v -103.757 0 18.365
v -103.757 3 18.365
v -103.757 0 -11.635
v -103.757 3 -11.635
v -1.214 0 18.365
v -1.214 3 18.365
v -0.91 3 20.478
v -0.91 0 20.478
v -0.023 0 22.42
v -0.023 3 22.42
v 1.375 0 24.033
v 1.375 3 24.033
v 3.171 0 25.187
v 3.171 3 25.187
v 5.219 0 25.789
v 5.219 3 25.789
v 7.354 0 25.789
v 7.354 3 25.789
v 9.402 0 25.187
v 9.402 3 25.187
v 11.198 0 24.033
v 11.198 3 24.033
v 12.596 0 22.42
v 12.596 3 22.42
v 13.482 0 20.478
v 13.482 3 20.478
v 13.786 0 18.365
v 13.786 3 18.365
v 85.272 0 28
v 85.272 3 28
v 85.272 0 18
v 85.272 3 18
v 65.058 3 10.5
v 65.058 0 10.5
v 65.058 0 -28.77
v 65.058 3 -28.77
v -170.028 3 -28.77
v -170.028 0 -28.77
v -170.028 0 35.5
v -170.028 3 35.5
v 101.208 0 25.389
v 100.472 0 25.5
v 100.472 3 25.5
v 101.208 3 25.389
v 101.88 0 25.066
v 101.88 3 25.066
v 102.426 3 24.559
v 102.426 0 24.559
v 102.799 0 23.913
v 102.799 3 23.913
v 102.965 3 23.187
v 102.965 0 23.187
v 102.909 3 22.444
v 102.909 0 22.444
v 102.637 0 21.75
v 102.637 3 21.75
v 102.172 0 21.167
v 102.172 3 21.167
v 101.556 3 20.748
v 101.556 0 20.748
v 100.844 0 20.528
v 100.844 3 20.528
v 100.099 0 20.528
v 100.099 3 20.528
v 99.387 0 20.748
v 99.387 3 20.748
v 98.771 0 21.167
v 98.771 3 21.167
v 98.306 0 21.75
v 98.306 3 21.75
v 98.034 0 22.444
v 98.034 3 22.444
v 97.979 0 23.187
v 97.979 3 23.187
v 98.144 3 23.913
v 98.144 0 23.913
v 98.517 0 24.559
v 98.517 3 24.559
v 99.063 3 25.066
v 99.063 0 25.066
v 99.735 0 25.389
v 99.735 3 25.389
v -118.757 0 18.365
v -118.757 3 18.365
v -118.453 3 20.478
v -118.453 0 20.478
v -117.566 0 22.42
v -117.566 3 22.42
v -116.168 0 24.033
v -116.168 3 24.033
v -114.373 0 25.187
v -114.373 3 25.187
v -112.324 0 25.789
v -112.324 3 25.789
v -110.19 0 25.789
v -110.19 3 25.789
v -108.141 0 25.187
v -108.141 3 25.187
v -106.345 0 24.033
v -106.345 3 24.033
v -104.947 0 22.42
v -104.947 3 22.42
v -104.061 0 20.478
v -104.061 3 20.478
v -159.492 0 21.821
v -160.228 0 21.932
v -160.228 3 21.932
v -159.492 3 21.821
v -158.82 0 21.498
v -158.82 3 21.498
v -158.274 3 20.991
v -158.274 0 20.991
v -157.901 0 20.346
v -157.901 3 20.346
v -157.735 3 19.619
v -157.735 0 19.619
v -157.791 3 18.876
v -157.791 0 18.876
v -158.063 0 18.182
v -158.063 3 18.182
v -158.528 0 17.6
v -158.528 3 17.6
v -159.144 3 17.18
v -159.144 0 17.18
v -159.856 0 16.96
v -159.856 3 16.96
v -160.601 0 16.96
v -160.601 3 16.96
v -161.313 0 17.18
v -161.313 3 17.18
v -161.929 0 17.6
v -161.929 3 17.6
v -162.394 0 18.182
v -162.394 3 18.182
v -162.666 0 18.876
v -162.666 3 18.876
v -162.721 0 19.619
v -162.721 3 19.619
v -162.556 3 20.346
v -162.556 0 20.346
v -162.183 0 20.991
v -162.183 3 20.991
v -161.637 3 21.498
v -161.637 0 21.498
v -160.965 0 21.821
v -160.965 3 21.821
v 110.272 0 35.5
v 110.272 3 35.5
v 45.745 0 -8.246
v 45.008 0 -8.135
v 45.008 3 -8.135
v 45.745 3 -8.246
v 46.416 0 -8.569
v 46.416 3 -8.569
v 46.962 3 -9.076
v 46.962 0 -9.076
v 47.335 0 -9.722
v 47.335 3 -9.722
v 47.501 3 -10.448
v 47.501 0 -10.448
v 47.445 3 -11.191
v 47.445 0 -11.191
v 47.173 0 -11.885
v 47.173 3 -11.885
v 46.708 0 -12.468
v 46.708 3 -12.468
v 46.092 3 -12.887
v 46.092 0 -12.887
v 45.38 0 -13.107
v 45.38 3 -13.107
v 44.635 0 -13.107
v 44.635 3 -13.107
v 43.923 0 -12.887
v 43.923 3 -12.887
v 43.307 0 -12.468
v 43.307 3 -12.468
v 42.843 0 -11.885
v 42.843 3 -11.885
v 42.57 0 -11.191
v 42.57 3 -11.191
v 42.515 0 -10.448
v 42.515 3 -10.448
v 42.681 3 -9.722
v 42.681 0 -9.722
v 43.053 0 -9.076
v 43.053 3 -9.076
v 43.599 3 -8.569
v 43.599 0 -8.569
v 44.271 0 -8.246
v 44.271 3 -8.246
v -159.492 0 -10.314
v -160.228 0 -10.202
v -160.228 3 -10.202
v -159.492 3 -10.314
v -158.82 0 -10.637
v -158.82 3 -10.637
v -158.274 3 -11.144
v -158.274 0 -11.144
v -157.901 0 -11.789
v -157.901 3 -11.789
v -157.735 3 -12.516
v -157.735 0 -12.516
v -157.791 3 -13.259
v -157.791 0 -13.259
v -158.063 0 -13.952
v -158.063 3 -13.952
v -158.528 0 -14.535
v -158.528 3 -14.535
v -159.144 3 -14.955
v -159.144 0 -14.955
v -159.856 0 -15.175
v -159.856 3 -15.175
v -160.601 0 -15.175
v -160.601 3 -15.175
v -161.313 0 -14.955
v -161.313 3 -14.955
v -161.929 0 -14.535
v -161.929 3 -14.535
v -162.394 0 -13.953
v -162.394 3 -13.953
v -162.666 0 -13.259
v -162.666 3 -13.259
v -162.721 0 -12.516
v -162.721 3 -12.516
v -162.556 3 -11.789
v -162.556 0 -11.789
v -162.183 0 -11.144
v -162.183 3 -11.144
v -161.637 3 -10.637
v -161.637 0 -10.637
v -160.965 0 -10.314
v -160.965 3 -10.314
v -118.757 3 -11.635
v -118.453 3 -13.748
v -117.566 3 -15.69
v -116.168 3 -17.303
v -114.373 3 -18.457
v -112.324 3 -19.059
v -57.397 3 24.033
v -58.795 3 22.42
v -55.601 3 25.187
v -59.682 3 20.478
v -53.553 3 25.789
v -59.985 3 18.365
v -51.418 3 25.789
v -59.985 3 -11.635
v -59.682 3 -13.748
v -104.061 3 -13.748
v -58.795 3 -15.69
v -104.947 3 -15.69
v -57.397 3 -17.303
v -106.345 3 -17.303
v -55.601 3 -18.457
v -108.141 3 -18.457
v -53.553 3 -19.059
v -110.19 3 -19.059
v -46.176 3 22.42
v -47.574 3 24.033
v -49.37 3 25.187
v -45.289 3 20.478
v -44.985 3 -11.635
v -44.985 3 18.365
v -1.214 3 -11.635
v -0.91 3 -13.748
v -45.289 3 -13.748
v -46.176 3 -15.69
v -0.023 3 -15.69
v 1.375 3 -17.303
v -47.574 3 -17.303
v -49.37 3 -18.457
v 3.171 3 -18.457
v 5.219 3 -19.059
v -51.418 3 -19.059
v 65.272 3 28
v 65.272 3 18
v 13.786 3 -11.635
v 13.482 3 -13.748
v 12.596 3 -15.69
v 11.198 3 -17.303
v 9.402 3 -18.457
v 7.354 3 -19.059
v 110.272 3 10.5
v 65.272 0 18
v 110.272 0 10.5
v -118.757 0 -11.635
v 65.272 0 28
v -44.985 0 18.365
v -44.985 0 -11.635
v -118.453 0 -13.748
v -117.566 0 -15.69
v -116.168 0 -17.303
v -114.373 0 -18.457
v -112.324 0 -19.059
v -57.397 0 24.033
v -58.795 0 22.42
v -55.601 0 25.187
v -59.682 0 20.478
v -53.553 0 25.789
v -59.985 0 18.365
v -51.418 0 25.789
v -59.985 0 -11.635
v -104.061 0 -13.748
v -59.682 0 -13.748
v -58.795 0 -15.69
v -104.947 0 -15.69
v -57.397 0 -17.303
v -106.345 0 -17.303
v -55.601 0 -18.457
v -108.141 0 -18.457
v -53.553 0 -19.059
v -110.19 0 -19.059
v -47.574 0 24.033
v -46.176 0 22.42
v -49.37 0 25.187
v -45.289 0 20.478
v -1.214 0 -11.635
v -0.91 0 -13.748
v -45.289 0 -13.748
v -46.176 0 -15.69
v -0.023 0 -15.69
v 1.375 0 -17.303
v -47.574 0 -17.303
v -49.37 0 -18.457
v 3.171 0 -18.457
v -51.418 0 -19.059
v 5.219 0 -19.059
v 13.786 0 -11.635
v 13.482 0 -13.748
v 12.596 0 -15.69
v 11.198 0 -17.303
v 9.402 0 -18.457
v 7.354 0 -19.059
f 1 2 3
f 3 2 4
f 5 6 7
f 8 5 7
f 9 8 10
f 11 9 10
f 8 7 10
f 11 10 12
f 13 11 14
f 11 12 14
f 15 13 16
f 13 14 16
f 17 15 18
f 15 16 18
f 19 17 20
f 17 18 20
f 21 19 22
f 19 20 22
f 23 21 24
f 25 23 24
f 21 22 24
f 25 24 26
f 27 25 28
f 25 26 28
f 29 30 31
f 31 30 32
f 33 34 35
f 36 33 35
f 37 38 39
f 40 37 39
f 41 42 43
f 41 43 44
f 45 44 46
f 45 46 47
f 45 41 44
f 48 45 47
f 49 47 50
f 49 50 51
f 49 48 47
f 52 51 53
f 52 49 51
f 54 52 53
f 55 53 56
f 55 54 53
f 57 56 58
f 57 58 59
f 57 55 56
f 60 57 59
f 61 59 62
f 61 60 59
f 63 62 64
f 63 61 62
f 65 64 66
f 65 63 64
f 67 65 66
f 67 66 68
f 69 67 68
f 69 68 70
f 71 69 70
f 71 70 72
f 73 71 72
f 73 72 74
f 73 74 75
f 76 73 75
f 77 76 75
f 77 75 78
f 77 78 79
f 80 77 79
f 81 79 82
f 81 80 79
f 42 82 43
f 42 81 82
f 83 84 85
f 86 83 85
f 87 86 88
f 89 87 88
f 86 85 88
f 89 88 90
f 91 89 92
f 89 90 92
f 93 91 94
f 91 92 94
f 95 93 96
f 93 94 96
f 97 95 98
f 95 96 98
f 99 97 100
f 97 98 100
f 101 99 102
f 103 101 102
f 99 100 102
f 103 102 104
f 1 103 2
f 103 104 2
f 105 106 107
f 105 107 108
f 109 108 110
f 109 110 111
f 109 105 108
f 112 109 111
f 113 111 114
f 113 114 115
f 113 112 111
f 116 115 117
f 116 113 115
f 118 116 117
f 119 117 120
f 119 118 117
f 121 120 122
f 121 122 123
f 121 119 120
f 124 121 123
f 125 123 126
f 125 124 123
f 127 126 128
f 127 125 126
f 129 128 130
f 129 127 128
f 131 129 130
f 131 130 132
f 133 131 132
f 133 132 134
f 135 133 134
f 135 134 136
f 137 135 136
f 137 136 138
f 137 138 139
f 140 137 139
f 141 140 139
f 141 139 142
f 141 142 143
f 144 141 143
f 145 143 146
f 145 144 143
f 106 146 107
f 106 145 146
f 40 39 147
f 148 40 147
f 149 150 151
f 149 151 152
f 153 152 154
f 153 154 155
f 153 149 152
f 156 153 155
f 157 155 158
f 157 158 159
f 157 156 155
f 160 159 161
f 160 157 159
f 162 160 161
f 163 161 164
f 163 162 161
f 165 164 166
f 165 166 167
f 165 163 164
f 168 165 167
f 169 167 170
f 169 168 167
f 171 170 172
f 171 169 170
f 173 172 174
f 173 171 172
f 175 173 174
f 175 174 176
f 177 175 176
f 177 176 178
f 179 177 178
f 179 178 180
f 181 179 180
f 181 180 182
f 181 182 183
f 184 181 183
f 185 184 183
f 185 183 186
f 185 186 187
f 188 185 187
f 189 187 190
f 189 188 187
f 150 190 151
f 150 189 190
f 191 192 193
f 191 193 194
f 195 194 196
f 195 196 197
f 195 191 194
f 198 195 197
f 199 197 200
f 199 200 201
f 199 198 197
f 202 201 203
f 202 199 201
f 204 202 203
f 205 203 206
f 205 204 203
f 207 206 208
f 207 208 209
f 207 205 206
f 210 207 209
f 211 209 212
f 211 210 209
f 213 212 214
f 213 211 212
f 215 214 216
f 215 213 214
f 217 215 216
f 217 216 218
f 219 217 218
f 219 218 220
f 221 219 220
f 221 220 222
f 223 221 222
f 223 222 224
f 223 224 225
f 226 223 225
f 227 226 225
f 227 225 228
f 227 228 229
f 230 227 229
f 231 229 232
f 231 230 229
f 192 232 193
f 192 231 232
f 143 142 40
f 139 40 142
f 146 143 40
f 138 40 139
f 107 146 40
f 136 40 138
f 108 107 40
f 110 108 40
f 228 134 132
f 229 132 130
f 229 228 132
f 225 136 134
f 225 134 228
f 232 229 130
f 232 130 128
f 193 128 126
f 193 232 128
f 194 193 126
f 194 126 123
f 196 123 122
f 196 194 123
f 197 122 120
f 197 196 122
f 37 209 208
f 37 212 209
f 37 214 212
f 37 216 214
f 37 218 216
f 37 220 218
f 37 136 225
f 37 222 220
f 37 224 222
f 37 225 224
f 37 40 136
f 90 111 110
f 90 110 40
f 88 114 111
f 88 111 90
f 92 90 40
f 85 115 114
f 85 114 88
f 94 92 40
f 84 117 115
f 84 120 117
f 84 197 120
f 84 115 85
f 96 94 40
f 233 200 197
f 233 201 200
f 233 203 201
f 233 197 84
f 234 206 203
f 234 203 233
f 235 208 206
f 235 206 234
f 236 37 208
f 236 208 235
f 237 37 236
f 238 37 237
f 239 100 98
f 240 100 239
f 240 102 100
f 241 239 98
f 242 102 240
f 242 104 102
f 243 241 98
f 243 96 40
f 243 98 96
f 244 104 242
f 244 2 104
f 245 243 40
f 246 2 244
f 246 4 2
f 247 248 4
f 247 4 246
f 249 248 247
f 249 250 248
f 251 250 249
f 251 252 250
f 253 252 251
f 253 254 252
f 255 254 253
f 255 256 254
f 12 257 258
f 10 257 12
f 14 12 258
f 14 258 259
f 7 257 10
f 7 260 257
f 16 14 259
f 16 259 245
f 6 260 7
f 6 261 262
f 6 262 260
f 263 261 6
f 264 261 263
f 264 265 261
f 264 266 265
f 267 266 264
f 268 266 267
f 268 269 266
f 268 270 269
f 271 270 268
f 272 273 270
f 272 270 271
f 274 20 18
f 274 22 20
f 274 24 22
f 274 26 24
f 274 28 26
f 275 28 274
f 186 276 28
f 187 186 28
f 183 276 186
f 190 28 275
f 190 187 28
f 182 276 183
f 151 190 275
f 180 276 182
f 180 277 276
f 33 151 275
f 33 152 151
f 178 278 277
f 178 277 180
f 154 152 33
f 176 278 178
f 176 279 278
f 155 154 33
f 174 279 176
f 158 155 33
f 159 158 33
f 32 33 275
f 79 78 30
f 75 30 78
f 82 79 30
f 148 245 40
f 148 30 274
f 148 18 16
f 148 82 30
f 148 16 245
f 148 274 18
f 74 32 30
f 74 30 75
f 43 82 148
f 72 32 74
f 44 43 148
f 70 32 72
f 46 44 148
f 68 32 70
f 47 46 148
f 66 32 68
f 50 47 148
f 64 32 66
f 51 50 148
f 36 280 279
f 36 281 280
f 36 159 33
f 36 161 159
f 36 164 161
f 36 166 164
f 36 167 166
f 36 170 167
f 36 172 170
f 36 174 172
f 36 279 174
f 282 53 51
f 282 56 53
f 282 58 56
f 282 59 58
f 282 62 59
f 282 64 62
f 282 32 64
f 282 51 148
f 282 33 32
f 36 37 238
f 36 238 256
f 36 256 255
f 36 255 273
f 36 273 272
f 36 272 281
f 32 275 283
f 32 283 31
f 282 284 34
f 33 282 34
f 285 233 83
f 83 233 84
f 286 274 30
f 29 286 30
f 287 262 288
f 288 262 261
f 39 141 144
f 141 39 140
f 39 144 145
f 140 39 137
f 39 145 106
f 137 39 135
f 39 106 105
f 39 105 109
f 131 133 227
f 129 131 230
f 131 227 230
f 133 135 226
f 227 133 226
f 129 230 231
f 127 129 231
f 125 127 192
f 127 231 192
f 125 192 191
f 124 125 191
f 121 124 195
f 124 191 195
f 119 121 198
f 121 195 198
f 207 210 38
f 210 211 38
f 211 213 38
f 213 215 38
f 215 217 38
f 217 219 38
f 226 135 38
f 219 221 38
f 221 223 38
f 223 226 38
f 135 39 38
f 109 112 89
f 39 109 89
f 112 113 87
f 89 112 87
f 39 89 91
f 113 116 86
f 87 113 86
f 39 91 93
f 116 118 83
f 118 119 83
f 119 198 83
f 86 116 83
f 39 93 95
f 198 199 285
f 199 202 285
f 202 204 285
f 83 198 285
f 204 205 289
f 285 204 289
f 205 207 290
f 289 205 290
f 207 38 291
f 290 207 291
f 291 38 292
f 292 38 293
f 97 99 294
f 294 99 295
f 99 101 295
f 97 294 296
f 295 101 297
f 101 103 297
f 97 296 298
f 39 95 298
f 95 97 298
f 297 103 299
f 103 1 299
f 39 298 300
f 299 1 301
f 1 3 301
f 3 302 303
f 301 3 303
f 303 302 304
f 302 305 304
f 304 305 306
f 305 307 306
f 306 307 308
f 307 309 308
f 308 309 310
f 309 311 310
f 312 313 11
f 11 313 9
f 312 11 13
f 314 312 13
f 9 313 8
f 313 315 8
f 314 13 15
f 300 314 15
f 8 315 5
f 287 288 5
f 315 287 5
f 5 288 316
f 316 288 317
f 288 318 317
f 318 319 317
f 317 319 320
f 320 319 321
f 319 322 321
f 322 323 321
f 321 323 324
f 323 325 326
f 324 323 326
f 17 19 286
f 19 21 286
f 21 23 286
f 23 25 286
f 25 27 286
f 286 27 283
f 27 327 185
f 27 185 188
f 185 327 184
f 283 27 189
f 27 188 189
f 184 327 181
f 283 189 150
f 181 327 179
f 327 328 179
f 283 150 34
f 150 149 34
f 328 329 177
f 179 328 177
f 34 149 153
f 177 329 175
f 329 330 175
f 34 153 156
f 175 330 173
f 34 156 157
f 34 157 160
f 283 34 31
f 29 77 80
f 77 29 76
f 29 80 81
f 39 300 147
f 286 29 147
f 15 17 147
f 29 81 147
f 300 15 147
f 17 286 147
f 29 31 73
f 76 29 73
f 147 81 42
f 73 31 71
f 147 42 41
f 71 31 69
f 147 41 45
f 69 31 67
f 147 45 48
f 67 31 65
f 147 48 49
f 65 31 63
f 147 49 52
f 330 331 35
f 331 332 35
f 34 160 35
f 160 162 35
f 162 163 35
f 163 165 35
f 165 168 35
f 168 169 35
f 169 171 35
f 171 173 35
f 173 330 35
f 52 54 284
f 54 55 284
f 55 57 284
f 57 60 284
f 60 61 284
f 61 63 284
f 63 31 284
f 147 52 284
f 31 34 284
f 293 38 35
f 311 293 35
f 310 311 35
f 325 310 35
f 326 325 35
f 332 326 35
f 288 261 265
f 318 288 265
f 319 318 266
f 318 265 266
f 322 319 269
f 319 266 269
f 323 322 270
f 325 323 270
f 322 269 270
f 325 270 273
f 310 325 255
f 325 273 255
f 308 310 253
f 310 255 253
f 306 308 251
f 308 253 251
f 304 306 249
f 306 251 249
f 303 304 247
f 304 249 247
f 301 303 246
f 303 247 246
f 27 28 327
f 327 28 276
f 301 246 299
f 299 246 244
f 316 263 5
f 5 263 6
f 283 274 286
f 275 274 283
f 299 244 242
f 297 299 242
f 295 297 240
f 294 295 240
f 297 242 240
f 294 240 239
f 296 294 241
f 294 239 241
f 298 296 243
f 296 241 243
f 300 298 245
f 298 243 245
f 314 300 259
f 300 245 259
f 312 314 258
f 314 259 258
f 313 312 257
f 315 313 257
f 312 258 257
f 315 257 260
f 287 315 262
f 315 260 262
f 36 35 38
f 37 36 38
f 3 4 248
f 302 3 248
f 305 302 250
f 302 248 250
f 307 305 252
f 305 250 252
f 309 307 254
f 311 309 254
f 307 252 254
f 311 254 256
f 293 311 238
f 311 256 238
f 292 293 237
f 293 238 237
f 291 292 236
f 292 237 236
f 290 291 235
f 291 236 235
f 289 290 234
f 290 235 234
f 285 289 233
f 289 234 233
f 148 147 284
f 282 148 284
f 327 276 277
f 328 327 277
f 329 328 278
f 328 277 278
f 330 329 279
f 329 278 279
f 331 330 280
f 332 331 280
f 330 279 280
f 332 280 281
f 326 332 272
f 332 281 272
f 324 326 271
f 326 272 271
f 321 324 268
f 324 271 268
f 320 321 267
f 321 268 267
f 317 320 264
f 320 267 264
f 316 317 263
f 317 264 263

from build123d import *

# Parameters (mm, degrees)
ESQUISSE1_R             = 2.5
BOSS_EXTRU_1_DEPTH      = 3
ESQUISSE2_W             = 20
ESQUISSE2_H             = 10
ENL_V_MAT_EXTRU_1_DEPTH = 174.720827721


with BuildPart() as part:
    # Esquisse1 → Boss.-Extru.1 (new body)
    with BuildSketch(Plane(origin=(0, 0, 0), x_dir=(1, 0, 0), z_dir=(0, 1, 0))):
        Polygon((-170.028456395, 18.77), (-170.028456395, -23), (-170.028456395, -35.5), (110.271543605, -35.5), (110.271543605, -10.5), (65.057787015, -10.5), (65.057787015, 28.77), (-170.028456395, 28.77), align=None)
        with Locations(Location((100.471543605, -23, 0), (0, 0, 270))):
            Circle(ESQUISSE1_R, mode=Mode.SUBTRACT)
        with Locations(Location((-160.228456395, -19.4325, 0), (0, 0, 270))):
            Circle(ESQUISSE1_R, mode=Mode.SUBTRACT)
        with Locations(Location((-160.228456395, 12.7025, 0), (0, 0, 270))):
            Circle(ESQUISSE1_R, mode=Mode.SUBTRACT)
        with Locations(Location((45.007787015, 10.635, 0), (0, 0, 270))):
            Circle(ESQUISSE1_R, mode=Mode.SUBTRACT)
    extrude(amount=BOSS_EXTRU_1_DEPTH)

    # Esquisse2 → Enlèv. mat.-Extru.1 (cut, through all)
    with BuildSketch(Plane(origin=(0, 3, 0), x_dir=(1, 0, 0), z_dir=(0, 1, 0))):
        with BuildLine():
            Line((-118.756895542, 11.635), (-118.756895542, -18.365))
            ThreePointArc((-118.756895542, -18.365), (-111.256895542, -25.865), (-103.756895542, -18.365))
            Line((-103.756895542, -18.365), (-103.756895542, 11.635))
            ThreePointArc((-103.756895542, 11.635), (-111.256895542, 19.135), (-118.756895542, 11.635))
        make_face()
        with BuildLine():
            Line((-59.98533469, 11.635), (-59.98533469, -18.365))
            ThreePointArc((-59.98533469, -18.365), (-52.48533469, -25.865), (-44.98533469, -18.365))
            Line((-44.98533469, -18.365), (-44.98533469, 11.635))
            ThreePointArc((-44.98533469, 11.635), (-52.48533469, 19.135), (-59.98533469, 11.635))
        make_face()
        with BuildLine():
            Line((-1.213773837, 11.635), (-1.213773837, -18.365))
            ThreePointArc((-1.213773837, -18.365), (6.286226163, -25.865), (13.786226163, -18.365))
            Line((13.786226163, -18.365), (13.786226163, 11.635))
            ThreePointArc((13.786226163, 11.635), (6.286226163, 19.135), (-1.213773837, 11.635))
        make_face()
        with Locations((75.271543605, -23)):
            Rectangle(ESQUISSE2_W, ESQUISSE2_H)
    extrude(amount=-ENL_V_MAT_EXTRU_1_DEPTH, mode=Mode.SUBTRACT)


solid = part.part
